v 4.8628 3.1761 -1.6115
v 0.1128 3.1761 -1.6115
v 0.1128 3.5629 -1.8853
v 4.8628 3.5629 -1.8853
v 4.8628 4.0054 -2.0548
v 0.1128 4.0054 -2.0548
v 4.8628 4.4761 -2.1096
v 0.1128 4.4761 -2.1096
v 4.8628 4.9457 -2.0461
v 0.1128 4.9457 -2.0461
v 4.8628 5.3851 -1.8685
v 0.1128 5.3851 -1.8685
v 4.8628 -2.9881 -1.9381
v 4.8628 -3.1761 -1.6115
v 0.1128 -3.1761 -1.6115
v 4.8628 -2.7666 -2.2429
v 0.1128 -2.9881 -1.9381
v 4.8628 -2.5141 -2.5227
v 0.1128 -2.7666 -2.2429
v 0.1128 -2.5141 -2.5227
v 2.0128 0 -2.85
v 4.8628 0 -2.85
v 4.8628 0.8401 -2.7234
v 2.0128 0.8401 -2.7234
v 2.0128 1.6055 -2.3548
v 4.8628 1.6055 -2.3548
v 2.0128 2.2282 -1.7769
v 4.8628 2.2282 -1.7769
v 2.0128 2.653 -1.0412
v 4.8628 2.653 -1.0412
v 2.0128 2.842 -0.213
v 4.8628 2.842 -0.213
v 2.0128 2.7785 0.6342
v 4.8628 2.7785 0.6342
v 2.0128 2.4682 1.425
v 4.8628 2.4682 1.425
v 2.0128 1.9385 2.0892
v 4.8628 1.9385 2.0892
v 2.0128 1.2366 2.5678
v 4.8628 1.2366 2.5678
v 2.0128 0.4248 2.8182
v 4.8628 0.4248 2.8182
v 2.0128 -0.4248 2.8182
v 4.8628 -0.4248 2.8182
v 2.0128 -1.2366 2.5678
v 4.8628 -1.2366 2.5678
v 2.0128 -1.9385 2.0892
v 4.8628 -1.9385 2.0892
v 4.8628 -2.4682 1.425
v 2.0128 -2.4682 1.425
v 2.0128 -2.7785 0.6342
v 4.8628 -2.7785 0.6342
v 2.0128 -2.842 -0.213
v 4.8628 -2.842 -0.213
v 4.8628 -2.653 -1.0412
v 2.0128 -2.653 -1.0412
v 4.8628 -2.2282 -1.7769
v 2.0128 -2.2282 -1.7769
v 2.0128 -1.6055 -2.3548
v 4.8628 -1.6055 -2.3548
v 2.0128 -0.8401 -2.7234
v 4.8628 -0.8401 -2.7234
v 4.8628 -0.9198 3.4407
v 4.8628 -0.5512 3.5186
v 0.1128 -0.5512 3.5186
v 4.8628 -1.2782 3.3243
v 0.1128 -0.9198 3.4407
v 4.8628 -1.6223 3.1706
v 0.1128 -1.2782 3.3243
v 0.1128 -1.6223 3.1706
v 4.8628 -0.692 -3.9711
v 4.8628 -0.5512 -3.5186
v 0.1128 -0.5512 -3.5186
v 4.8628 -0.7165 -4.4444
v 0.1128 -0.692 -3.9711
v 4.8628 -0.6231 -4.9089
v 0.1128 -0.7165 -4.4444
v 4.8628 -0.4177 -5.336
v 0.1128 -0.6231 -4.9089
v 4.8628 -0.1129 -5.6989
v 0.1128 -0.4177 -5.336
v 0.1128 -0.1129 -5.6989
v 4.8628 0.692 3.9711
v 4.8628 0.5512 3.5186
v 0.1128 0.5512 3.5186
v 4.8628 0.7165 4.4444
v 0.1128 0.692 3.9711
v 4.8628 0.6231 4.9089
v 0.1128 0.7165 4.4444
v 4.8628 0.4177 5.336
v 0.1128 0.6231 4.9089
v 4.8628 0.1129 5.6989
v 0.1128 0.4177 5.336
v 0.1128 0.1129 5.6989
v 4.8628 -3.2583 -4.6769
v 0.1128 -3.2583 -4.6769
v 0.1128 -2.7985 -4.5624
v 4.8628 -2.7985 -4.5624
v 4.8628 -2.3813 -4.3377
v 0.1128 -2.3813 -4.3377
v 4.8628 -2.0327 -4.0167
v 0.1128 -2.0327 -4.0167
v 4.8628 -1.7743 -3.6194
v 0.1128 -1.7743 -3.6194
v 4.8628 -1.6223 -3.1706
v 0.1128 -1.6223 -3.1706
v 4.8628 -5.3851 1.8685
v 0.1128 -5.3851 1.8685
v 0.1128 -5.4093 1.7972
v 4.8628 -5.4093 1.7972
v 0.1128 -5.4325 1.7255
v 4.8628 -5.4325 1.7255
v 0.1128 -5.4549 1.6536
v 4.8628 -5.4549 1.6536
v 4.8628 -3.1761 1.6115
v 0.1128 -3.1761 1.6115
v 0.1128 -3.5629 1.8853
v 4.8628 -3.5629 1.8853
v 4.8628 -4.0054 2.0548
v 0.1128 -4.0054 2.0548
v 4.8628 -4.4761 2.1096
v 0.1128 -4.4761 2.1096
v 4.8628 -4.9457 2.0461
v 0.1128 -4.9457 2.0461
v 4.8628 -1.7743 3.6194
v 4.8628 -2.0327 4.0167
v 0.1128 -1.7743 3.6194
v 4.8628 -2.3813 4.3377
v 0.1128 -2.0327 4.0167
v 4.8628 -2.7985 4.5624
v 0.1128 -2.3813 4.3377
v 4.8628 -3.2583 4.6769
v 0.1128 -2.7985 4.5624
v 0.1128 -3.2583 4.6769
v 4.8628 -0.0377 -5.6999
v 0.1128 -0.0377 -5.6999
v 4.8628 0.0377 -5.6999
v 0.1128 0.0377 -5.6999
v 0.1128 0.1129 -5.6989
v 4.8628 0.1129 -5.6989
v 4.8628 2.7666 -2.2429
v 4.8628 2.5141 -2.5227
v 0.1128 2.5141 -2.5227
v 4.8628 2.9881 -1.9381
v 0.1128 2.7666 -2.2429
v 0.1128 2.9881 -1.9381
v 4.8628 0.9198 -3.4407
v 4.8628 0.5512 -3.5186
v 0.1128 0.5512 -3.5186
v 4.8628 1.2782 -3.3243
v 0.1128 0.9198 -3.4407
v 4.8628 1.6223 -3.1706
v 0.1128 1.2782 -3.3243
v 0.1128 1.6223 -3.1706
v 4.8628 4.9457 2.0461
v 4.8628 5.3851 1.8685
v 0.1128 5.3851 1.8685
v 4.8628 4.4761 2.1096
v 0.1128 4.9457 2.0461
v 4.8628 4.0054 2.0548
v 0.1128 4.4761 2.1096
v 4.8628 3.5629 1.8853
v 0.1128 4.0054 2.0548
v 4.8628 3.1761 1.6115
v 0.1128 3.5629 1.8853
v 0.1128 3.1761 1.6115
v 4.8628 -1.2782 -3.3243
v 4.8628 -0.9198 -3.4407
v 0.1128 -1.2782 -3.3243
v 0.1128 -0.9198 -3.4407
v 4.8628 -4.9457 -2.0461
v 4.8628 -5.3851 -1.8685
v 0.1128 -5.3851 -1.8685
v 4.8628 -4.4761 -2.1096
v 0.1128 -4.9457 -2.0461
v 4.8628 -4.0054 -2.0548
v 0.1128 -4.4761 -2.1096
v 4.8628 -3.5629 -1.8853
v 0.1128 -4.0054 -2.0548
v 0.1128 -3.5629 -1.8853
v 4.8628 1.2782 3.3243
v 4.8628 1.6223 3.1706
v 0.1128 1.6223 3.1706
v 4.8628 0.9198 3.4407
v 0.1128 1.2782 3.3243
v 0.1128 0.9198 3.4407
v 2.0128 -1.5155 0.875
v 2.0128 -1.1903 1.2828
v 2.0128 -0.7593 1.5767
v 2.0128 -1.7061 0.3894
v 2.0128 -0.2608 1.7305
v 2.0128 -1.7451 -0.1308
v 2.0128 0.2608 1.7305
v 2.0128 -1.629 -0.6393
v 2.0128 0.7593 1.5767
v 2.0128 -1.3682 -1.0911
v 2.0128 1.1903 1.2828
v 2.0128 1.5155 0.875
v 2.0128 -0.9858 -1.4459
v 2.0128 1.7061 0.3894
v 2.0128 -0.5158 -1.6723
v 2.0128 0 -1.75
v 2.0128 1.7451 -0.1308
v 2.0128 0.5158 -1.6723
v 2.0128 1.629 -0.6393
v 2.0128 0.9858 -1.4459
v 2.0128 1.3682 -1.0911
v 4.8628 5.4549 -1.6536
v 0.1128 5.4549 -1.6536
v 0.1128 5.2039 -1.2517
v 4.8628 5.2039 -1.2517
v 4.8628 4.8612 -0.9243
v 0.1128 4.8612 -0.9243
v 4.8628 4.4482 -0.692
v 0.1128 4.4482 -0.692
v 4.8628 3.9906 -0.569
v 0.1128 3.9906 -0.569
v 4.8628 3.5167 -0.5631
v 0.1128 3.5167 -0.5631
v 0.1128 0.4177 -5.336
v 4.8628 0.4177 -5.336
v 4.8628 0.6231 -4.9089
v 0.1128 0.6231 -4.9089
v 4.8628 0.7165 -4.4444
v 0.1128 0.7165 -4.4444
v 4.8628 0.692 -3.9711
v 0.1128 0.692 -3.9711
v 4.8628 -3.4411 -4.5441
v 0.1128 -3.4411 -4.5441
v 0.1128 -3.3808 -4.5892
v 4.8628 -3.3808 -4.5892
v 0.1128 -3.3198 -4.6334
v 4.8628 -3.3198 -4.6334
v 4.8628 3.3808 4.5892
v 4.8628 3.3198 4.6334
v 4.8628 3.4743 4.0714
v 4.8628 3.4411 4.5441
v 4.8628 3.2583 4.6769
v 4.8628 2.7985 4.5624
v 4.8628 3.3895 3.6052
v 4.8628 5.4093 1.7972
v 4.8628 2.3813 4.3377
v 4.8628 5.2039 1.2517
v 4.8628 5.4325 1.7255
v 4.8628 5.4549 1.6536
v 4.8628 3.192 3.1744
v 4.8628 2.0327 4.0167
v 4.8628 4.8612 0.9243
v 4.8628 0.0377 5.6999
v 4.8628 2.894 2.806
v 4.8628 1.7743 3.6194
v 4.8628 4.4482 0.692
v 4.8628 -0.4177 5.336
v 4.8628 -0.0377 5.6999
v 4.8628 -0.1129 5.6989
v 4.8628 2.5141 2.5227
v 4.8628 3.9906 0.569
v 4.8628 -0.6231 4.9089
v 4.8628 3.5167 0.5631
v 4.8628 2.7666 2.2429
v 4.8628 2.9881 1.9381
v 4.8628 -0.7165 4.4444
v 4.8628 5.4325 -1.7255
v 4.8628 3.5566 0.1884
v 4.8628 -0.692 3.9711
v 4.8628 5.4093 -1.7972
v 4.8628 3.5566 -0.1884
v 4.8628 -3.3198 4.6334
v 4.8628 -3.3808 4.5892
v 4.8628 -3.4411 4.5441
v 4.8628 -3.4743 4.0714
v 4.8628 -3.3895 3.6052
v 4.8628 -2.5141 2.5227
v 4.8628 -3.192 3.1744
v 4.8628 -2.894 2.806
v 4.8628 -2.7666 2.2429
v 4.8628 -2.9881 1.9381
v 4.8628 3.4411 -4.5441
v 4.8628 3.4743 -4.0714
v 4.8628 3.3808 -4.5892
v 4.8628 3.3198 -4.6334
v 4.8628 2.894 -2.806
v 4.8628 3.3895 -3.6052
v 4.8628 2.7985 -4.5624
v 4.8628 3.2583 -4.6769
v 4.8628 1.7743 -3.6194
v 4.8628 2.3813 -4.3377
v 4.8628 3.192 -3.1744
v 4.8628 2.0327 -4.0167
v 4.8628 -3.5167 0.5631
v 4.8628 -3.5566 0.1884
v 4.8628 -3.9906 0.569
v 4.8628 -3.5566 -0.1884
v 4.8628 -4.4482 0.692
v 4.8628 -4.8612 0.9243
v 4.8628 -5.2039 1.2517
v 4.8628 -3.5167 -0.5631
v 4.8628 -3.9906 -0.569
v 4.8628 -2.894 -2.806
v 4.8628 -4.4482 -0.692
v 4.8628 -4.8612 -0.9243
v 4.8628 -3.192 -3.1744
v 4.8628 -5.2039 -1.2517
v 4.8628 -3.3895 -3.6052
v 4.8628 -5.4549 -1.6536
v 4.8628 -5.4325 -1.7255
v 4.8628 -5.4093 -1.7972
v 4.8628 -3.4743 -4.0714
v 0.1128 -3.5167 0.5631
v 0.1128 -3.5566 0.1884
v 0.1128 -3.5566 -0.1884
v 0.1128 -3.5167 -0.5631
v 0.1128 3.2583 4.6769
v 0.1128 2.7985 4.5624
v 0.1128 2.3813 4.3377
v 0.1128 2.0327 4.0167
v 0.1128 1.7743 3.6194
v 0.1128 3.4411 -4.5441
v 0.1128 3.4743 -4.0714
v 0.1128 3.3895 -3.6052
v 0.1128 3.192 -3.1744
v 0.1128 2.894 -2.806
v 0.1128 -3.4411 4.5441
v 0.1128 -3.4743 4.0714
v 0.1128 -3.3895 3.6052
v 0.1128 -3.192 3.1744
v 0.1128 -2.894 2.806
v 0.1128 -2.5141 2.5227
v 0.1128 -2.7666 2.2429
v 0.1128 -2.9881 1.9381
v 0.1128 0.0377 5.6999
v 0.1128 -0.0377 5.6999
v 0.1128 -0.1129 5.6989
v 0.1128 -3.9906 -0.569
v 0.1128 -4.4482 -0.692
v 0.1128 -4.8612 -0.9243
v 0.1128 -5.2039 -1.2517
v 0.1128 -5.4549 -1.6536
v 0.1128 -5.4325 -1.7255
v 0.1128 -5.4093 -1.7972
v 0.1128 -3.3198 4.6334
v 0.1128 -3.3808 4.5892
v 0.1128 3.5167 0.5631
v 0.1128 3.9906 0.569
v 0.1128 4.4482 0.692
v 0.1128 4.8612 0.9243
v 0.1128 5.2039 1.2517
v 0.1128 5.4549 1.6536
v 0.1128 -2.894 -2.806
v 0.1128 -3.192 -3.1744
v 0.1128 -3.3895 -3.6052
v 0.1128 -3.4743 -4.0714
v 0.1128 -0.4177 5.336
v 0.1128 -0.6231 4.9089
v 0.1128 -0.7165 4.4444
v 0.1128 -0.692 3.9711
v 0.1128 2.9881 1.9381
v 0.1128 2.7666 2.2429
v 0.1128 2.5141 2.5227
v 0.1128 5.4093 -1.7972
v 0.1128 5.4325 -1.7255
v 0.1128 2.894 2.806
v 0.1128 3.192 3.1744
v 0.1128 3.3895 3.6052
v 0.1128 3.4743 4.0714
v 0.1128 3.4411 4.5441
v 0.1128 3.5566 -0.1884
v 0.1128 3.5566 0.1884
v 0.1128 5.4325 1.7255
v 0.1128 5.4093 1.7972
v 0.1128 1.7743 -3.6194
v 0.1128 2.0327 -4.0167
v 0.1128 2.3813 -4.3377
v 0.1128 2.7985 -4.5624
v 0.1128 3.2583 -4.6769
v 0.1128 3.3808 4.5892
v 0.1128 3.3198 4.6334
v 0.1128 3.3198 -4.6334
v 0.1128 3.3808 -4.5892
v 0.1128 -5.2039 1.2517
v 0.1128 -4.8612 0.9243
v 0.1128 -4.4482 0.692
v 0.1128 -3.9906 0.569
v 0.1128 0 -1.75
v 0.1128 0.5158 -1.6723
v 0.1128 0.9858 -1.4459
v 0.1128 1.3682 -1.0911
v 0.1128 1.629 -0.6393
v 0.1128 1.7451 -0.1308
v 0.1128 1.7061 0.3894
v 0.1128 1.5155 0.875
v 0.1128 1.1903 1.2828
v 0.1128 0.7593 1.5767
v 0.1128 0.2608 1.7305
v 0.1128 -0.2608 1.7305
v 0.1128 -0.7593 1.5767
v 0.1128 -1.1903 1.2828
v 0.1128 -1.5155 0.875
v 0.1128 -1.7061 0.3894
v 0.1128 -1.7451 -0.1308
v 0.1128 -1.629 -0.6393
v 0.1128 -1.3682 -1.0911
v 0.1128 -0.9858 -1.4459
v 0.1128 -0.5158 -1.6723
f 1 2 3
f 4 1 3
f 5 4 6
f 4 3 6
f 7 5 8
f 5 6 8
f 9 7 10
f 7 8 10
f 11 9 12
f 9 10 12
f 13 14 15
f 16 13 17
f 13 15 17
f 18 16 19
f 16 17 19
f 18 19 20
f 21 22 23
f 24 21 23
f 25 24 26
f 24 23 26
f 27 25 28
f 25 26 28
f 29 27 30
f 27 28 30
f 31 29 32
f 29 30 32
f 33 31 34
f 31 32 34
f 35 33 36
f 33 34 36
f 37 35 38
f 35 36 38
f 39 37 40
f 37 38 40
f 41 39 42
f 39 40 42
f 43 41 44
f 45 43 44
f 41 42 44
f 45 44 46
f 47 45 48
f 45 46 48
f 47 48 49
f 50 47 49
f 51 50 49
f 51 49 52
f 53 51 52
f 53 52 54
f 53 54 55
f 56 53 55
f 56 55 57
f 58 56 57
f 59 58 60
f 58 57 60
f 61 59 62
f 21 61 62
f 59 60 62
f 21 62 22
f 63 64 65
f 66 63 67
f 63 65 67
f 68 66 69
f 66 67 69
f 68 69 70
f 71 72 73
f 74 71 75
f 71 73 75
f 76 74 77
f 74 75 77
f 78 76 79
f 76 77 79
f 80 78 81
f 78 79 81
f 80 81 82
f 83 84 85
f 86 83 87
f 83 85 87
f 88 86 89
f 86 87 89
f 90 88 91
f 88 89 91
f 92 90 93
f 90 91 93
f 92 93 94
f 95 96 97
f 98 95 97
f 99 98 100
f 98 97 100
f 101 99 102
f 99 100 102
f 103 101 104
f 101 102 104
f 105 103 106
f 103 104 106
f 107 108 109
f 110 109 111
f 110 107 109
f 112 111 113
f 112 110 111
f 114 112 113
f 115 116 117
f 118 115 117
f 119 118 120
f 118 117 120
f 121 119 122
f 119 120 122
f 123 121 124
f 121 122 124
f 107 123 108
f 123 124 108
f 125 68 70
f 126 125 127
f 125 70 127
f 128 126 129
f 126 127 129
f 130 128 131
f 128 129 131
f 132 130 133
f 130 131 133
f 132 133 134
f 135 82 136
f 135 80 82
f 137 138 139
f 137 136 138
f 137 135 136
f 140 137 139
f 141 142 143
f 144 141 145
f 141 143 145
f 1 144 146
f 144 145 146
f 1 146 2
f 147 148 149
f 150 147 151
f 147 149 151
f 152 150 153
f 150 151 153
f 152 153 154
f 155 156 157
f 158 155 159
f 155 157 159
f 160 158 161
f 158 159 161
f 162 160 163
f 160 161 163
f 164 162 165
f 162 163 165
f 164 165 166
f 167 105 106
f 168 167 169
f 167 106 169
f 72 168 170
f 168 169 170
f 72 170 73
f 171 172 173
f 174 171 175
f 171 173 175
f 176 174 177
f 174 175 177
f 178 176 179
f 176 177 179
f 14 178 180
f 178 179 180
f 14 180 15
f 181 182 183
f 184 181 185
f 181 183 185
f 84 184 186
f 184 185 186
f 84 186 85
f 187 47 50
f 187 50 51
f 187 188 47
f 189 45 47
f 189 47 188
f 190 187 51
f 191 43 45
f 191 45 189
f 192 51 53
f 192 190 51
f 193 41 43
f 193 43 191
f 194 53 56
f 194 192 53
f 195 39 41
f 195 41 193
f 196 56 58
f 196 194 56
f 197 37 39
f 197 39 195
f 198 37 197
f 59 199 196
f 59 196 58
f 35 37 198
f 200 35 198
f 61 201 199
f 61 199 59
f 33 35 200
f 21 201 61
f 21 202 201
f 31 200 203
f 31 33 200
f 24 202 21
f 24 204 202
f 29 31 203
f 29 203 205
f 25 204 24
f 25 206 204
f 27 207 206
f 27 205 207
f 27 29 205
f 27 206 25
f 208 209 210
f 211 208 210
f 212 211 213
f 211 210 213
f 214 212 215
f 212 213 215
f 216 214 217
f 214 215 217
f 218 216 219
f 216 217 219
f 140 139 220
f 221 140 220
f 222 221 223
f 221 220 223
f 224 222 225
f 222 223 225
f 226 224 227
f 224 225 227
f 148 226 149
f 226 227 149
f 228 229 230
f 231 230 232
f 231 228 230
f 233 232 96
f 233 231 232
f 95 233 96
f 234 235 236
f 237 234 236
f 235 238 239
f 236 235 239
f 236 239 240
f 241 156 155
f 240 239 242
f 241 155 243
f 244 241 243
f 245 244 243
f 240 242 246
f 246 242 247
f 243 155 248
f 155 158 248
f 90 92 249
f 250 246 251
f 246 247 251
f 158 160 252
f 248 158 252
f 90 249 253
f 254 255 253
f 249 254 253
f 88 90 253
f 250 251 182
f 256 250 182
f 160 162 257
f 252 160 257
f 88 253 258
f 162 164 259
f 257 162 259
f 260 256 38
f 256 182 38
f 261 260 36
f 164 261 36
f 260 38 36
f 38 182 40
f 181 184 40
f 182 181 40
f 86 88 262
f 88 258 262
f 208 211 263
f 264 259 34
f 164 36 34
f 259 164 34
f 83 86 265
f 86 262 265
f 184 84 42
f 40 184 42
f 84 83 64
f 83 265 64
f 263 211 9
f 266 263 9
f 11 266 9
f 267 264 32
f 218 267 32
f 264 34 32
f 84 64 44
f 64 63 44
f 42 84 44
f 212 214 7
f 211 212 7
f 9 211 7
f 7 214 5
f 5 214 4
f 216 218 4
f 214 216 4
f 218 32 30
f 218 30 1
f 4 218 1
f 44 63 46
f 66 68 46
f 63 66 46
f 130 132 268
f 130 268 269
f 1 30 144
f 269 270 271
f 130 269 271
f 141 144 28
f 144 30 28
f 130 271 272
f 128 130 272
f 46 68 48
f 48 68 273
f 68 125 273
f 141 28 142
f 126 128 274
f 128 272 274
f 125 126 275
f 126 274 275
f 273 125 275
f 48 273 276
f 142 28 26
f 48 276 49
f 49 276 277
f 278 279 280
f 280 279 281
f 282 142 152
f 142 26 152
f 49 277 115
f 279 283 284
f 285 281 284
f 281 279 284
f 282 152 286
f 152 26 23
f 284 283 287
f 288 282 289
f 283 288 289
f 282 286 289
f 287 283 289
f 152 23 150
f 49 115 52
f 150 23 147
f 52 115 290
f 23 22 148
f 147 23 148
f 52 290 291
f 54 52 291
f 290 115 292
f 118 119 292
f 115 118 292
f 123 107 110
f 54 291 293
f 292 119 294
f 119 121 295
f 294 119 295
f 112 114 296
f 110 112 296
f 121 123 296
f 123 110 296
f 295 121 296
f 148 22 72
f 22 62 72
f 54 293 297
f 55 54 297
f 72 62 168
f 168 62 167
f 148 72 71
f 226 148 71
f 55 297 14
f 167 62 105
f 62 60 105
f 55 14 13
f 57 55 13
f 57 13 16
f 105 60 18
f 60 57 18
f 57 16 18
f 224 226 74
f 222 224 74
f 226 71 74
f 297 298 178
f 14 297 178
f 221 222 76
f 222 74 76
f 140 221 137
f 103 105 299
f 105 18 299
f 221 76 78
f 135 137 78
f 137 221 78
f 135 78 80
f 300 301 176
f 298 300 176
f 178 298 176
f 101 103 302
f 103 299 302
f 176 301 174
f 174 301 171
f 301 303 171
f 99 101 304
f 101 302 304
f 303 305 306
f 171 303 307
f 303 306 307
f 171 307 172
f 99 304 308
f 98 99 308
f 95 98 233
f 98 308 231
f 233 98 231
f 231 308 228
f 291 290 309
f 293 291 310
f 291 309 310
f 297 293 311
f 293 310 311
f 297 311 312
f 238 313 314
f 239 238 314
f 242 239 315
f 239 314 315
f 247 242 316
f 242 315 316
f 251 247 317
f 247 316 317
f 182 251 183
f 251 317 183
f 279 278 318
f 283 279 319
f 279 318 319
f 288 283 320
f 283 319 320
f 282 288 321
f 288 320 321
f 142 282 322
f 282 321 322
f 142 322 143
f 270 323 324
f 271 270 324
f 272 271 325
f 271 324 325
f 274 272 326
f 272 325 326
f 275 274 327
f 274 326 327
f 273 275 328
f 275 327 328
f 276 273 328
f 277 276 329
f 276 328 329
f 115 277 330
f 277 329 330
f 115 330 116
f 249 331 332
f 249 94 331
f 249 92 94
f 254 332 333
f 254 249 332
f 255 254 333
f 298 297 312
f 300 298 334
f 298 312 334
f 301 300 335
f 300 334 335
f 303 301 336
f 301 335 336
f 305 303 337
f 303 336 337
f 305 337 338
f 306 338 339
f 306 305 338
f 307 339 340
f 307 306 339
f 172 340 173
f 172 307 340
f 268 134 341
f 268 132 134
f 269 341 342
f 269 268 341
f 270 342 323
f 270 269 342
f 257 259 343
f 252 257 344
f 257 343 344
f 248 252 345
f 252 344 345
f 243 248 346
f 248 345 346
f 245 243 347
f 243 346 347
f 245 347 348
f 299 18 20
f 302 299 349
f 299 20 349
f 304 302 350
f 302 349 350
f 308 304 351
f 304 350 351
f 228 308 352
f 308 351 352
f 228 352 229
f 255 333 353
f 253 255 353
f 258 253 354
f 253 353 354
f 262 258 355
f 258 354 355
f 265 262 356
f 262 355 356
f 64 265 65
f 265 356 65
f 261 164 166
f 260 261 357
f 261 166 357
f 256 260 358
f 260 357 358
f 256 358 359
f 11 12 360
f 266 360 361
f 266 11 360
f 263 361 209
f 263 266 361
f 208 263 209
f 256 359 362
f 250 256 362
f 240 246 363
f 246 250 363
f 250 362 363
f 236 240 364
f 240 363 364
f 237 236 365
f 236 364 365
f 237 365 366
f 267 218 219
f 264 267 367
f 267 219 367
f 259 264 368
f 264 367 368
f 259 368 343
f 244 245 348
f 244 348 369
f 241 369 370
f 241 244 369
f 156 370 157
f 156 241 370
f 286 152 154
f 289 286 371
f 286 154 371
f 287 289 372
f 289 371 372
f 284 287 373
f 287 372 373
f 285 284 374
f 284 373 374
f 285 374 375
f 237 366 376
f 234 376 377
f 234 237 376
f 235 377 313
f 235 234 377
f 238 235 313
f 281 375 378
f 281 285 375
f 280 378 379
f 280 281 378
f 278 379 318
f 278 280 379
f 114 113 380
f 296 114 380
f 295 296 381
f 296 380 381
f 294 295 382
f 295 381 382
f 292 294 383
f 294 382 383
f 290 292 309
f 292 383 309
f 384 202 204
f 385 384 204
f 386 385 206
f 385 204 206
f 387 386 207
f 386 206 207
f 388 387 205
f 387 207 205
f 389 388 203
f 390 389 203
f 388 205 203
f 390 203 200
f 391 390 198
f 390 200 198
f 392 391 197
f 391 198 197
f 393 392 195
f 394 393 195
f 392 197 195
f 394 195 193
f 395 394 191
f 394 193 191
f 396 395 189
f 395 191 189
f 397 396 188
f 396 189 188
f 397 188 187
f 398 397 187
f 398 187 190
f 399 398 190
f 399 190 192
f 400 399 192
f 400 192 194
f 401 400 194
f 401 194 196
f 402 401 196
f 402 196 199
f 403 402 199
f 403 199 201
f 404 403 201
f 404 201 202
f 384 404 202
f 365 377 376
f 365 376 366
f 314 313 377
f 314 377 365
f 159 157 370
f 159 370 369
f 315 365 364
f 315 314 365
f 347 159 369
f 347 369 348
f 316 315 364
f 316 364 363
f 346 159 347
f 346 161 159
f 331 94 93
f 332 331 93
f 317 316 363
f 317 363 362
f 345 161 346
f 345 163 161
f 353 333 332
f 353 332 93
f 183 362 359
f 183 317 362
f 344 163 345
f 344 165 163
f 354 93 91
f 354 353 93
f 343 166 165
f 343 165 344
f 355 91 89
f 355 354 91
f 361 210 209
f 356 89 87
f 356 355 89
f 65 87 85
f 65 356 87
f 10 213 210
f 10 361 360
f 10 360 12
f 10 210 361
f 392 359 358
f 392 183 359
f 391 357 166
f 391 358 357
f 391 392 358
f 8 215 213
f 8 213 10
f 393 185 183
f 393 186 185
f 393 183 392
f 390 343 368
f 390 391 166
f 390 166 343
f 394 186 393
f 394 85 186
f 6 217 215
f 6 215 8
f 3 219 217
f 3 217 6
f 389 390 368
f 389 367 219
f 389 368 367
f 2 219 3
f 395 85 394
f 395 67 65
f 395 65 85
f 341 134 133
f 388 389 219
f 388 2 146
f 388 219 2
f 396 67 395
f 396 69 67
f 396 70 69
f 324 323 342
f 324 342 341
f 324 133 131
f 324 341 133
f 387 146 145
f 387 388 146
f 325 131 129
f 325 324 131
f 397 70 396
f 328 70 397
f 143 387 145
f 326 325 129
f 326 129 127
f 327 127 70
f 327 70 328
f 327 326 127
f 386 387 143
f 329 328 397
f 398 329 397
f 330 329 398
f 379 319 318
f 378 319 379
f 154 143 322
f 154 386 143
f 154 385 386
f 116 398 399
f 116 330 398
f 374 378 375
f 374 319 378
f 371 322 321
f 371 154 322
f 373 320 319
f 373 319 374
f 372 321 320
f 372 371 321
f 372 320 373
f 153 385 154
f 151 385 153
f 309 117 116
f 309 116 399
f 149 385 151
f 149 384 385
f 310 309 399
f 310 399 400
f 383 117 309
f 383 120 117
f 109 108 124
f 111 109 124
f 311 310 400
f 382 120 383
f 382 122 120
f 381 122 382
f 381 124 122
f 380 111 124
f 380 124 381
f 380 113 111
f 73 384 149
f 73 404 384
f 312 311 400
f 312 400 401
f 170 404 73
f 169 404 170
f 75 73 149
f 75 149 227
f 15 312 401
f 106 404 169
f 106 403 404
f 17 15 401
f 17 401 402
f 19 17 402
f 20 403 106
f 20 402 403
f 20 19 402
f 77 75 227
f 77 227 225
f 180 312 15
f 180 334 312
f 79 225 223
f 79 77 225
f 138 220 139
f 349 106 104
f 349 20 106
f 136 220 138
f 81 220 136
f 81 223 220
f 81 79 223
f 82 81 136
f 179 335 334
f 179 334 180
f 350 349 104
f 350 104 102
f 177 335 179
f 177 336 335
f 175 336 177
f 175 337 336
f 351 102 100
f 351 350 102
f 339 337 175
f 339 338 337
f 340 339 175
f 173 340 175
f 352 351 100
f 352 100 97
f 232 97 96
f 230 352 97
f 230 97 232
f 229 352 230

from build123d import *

# Parameters (mm, degrees)
BASPROSKE_W        = 5
BASPROSKE_H        = 6
TOOTHCUT_DEPTH     = 10.848857802
TEETHCUTS_COUNT    = 10
TEETHCUTS_ANGLE    = 324
BORSKE_R           = 1.5
BORE_DEPTH         = 50.0000508
SKETCH1_R          = 3
CUT_EXTRUDE1_DEPTH = 3
SCALE1_SCALE       = 0.95
SKETCH2_R          = 1.75
CUT_EXTRUDE2_DEPTH = 9.38856389


with BuildPart() as part:
    # BasProSke → Base-Revolve (revolve)
    with BuildSketch(Plane(origin=(0, 0, 0), x_dir=(1, 0, 0), z_dir=(0, 1, 0)), mode=Mode.PRIVATE) as base_revolve_sk:
        with Locations((2.5, 3)):
            Rectangle(BASPROSKE_W, BASPROSKE_H)
    revolve(base_revolve_sk.sketch.rotate(Axis((-10, 0, 0), (1, 0, 0)), 180), axis=Axis((-10, 0, 0), (1, 0, 0)))

    # TooCutSke → ToothCut (cut, through all)
    with BuildSketch(Plane(origin=(0, 0, 0), x_dir=(0, 0, -1), z_dir=(1, 0, 0))):
        with BuildLine():
            ThreePointArc((0.59278292, 3.701838653), (0, 3.749), (-0.59278292, 3.701838653))
            ThreePointArc((-0.59278292, 3.701838653), (-0.846593509, 4.924114224), (-1.775771316, 5.757784417))
            ThreePointArc((-1.775771316, 5.757784417), (0, 6.0254), (1.775771316, 5.757784417))
            ThreePointArc((1.775771316, 5.757784417), (0.846593509, 4.924114224), (0.59278292, 3.701838653))
        make_face()
    toothcut = extrude(amount=TOOTHCUT_DEPTH, mode=Mode.SUBTRACT)

    # TeethCuts: ToothCut ×10 about axis
    teethcuts_axis = Axis((-10, 0, 0), (1, 0, 0))
    for i in range(1, TEETHCUTS_COUNT):
        add(toothcut.rotate(teethcuts_axis, i * TEETHCUTS_ANGLE / (TEETHCUTS_COUNT - 1)), mode=Mode.SUBTRACT)

    # BorSke → Bore (cut, symmetric)
    with BuildSketch(Plane(origin=(0, 0, 0), x_dir=(0, 0, -1), z_dir=(1, 0, 0))):
        with Locations(Location((0, 0, 0), (0, 0, 180))):
            Circle(BORSKE_R)
    extrude(amount=BORE_DEPTH, both=True, mode=Mode.SUBTRACT)

    # Sketch1 → Cut-Extrude1 (cut)
    with BuildSketch(Plane(origin=(5, 0, 0), x_dir=(0, 0, -1), z_dir=(1, 0, 0))):
        Circle(SKETCH1_R)
    extrude(amount=-CUT_EXTRUDE1_DEPTH, mode=Mode.SUBTRACT)


with BuildPart() as part_1:
    # Scale1: scaled about (2.255821785, 0, 0)
    add(part.part.scale(SCALE1_SCALE).moved(Location((0.112791089, 0, 0))))

    # Sketch2 → Cut-Extrude2 (cut, through all)
    with BuildSketch(Plane(origin=(2.012791089, 0, 0), x_dir=(0, 0, -1), z_dir=(1, 0, 0))):
        Circle(SKETCH2_R)
    extrude(amount=-CUT_EXTRUDE2_DEPTH, mode=Mode.SUBTRACT)


solid = part_1.part
